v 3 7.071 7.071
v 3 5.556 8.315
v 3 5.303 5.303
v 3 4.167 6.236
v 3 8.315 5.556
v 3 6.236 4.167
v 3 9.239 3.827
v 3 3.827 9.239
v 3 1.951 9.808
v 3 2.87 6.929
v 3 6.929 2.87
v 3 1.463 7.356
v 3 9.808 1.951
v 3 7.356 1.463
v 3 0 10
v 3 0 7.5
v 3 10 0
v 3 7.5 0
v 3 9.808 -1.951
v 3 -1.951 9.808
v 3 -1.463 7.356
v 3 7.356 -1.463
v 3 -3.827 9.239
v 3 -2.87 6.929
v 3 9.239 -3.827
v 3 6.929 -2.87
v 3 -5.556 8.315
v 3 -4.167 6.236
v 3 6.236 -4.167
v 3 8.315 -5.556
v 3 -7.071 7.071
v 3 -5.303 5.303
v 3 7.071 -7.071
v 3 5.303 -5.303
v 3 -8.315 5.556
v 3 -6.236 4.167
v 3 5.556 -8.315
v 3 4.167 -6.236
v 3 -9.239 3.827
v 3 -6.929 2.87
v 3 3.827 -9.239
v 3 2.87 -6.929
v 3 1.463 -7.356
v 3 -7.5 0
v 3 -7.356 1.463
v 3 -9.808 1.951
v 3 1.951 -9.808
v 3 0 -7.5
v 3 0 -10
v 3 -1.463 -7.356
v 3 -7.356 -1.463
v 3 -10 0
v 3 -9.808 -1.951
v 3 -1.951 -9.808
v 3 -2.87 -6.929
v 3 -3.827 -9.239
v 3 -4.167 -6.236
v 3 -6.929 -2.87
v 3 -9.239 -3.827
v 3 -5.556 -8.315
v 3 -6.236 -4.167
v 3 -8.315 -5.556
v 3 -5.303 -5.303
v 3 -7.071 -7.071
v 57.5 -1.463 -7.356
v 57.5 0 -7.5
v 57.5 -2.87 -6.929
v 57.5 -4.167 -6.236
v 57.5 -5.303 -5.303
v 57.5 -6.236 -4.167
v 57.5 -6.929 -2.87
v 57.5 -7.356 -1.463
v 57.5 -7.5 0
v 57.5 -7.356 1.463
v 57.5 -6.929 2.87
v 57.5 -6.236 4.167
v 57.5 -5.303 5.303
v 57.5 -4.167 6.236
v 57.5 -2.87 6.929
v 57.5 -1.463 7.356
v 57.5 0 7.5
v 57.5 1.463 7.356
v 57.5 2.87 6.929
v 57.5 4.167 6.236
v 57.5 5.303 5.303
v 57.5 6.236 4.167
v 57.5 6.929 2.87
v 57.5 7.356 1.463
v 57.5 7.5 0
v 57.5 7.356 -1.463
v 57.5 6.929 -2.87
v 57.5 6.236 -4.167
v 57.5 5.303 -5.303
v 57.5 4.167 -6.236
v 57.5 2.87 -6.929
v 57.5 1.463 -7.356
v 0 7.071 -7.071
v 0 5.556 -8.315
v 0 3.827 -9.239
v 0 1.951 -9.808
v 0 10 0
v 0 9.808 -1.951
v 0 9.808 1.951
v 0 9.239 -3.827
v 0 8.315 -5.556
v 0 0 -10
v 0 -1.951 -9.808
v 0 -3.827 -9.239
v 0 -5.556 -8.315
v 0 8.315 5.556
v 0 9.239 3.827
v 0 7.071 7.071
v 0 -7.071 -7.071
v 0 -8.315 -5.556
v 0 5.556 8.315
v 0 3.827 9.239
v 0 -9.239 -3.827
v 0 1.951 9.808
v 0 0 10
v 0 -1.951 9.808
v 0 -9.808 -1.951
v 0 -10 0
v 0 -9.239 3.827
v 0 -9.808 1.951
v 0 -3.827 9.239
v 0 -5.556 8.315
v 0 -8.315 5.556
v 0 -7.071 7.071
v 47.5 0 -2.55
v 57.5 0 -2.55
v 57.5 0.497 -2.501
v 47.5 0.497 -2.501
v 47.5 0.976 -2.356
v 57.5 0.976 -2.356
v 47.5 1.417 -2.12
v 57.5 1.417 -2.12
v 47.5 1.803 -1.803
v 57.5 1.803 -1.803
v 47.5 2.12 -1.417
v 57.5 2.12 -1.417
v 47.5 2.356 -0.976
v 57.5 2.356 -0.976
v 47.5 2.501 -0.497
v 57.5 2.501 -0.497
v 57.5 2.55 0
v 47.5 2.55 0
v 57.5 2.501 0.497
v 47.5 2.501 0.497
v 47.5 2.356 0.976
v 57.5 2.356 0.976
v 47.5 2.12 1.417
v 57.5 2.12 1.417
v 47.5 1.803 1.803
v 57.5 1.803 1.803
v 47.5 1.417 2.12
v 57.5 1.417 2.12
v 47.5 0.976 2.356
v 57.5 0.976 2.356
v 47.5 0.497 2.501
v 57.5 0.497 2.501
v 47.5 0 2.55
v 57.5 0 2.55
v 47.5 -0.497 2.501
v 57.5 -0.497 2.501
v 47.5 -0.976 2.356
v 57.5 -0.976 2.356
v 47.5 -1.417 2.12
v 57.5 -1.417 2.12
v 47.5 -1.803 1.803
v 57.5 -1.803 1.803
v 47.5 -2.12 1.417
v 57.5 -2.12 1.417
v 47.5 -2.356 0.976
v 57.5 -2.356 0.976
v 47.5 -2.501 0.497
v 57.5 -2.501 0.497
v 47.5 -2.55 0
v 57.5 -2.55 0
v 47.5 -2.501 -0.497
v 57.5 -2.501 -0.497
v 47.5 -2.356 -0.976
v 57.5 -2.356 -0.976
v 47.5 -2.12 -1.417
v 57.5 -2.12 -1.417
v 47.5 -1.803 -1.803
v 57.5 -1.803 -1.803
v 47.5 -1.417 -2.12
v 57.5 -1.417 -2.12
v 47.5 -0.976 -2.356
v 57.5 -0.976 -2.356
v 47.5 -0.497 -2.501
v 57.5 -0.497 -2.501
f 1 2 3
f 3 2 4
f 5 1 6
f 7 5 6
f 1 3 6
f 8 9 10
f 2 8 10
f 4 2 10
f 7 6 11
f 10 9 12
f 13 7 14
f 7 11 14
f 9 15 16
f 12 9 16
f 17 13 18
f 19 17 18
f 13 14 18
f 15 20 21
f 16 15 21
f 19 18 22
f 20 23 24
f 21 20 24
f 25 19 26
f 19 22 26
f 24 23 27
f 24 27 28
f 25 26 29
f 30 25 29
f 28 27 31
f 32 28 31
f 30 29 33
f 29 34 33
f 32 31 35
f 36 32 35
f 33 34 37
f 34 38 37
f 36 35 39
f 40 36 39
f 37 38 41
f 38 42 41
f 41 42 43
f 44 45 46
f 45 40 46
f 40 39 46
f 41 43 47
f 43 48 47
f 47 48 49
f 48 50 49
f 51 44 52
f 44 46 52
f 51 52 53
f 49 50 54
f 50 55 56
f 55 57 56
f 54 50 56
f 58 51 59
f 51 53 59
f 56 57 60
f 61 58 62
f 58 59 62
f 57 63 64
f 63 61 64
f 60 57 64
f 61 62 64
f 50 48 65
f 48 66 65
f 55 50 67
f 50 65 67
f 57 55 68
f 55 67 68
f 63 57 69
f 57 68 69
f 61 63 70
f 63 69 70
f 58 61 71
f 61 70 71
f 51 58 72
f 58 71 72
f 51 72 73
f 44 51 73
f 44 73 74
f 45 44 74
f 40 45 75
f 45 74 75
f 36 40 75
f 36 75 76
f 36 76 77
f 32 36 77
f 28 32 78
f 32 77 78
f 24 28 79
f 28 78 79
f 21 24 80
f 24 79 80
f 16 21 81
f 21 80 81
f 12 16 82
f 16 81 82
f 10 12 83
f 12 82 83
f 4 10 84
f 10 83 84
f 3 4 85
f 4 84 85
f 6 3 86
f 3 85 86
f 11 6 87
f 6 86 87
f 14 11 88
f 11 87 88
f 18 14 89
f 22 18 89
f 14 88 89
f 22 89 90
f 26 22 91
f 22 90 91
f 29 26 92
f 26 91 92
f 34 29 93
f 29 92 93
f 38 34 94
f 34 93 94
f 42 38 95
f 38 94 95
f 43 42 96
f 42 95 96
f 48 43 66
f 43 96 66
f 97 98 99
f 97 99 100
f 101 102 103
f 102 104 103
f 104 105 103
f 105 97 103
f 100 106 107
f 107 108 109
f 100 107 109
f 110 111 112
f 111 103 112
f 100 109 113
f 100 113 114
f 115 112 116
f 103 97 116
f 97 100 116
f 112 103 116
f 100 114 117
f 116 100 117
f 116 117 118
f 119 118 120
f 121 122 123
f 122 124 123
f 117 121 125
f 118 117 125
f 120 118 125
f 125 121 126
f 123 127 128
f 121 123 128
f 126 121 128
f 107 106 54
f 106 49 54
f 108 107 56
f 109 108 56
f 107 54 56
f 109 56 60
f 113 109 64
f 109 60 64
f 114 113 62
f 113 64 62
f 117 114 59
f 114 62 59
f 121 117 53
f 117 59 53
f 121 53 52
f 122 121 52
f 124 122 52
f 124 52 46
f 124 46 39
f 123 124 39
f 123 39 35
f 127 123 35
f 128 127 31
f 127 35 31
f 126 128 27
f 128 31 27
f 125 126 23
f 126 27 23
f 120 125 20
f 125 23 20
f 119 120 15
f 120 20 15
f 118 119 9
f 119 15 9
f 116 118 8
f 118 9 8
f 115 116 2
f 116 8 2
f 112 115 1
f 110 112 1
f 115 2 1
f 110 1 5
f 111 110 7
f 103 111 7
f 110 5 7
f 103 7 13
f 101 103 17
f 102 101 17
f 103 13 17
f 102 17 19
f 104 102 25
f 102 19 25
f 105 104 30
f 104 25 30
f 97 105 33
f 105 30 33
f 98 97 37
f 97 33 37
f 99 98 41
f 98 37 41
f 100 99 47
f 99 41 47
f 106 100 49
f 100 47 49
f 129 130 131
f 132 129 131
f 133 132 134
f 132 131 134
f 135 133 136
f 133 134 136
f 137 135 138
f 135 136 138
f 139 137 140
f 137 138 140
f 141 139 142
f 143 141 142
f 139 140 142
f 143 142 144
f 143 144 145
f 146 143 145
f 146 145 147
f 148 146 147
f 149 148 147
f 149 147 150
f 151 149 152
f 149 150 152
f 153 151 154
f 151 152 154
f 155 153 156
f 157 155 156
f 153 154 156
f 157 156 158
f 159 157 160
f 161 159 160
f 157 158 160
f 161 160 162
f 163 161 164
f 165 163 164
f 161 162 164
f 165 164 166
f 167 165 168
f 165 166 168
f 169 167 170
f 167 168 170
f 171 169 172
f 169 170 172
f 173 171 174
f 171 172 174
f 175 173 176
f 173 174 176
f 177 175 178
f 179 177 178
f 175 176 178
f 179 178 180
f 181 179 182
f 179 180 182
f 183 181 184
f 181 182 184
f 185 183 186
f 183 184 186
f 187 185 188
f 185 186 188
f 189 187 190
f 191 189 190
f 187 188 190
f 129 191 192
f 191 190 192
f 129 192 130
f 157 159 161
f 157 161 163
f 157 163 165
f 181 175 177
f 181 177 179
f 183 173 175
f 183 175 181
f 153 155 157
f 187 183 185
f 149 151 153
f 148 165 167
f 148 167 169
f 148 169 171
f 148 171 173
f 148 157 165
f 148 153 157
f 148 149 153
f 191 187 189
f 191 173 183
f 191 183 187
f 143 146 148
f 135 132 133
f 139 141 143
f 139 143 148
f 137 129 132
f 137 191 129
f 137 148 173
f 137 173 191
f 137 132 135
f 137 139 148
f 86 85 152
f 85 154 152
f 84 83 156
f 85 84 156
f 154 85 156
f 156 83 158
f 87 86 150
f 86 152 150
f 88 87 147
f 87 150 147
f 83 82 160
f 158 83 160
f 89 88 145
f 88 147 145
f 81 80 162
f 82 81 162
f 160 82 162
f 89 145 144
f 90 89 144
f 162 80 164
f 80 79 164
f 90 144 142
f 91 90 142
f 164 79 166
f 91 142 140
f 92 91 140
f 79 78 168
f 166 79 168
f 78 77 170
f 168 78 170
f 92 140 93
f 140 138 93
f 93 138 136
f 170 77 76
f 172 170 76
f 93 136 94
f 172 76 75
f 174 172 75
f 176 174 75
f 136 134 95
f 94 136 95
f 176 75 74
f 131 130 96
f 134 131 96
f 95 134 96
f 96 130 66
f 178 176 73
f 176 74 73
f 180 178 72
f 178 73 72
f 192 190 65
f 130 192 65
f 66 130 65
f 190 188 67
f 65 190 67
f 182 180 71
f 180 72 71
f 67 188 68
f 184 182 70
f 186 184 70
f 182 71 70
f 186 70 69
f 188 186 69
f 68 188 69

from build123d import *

# Parameters (mm, degrees)
SKETCH2_R          = 2.55
CUT_EXTRUDE1_DEPTH = 10


with BuildPart() as part:
    # Sketch1 → Revolve1 (revolve)
    with BuildSketch(Plane.XY, mode=Mode.PRIVATE) as revolve1_sk:
        Polygon((0, 0), (0, 10), (3, 10), (3, 7.5), (57.5, 7.5), (57.5, 0), align=None)
    revolve(revolve1_sk.sketch.rotate(Axis((0, 0, 0), (-1, 0, 0)), 90), axis=Axis((0, 0, 0), (-1, 0, 0)))

    # Sketch2 → Cut-Extrude1 (cut)
    with BuildSketch(Plane(origin=(57.5, 0, 0), x_dir=(0, 0, -1), z_dir=(1, 0, 0))):
        Circle(SKETCH2_R)
    extrude(amount=-CUT_EXTRUDE1_DEPTH, mode=Mode.SUBTRACT)


solid = part.part
